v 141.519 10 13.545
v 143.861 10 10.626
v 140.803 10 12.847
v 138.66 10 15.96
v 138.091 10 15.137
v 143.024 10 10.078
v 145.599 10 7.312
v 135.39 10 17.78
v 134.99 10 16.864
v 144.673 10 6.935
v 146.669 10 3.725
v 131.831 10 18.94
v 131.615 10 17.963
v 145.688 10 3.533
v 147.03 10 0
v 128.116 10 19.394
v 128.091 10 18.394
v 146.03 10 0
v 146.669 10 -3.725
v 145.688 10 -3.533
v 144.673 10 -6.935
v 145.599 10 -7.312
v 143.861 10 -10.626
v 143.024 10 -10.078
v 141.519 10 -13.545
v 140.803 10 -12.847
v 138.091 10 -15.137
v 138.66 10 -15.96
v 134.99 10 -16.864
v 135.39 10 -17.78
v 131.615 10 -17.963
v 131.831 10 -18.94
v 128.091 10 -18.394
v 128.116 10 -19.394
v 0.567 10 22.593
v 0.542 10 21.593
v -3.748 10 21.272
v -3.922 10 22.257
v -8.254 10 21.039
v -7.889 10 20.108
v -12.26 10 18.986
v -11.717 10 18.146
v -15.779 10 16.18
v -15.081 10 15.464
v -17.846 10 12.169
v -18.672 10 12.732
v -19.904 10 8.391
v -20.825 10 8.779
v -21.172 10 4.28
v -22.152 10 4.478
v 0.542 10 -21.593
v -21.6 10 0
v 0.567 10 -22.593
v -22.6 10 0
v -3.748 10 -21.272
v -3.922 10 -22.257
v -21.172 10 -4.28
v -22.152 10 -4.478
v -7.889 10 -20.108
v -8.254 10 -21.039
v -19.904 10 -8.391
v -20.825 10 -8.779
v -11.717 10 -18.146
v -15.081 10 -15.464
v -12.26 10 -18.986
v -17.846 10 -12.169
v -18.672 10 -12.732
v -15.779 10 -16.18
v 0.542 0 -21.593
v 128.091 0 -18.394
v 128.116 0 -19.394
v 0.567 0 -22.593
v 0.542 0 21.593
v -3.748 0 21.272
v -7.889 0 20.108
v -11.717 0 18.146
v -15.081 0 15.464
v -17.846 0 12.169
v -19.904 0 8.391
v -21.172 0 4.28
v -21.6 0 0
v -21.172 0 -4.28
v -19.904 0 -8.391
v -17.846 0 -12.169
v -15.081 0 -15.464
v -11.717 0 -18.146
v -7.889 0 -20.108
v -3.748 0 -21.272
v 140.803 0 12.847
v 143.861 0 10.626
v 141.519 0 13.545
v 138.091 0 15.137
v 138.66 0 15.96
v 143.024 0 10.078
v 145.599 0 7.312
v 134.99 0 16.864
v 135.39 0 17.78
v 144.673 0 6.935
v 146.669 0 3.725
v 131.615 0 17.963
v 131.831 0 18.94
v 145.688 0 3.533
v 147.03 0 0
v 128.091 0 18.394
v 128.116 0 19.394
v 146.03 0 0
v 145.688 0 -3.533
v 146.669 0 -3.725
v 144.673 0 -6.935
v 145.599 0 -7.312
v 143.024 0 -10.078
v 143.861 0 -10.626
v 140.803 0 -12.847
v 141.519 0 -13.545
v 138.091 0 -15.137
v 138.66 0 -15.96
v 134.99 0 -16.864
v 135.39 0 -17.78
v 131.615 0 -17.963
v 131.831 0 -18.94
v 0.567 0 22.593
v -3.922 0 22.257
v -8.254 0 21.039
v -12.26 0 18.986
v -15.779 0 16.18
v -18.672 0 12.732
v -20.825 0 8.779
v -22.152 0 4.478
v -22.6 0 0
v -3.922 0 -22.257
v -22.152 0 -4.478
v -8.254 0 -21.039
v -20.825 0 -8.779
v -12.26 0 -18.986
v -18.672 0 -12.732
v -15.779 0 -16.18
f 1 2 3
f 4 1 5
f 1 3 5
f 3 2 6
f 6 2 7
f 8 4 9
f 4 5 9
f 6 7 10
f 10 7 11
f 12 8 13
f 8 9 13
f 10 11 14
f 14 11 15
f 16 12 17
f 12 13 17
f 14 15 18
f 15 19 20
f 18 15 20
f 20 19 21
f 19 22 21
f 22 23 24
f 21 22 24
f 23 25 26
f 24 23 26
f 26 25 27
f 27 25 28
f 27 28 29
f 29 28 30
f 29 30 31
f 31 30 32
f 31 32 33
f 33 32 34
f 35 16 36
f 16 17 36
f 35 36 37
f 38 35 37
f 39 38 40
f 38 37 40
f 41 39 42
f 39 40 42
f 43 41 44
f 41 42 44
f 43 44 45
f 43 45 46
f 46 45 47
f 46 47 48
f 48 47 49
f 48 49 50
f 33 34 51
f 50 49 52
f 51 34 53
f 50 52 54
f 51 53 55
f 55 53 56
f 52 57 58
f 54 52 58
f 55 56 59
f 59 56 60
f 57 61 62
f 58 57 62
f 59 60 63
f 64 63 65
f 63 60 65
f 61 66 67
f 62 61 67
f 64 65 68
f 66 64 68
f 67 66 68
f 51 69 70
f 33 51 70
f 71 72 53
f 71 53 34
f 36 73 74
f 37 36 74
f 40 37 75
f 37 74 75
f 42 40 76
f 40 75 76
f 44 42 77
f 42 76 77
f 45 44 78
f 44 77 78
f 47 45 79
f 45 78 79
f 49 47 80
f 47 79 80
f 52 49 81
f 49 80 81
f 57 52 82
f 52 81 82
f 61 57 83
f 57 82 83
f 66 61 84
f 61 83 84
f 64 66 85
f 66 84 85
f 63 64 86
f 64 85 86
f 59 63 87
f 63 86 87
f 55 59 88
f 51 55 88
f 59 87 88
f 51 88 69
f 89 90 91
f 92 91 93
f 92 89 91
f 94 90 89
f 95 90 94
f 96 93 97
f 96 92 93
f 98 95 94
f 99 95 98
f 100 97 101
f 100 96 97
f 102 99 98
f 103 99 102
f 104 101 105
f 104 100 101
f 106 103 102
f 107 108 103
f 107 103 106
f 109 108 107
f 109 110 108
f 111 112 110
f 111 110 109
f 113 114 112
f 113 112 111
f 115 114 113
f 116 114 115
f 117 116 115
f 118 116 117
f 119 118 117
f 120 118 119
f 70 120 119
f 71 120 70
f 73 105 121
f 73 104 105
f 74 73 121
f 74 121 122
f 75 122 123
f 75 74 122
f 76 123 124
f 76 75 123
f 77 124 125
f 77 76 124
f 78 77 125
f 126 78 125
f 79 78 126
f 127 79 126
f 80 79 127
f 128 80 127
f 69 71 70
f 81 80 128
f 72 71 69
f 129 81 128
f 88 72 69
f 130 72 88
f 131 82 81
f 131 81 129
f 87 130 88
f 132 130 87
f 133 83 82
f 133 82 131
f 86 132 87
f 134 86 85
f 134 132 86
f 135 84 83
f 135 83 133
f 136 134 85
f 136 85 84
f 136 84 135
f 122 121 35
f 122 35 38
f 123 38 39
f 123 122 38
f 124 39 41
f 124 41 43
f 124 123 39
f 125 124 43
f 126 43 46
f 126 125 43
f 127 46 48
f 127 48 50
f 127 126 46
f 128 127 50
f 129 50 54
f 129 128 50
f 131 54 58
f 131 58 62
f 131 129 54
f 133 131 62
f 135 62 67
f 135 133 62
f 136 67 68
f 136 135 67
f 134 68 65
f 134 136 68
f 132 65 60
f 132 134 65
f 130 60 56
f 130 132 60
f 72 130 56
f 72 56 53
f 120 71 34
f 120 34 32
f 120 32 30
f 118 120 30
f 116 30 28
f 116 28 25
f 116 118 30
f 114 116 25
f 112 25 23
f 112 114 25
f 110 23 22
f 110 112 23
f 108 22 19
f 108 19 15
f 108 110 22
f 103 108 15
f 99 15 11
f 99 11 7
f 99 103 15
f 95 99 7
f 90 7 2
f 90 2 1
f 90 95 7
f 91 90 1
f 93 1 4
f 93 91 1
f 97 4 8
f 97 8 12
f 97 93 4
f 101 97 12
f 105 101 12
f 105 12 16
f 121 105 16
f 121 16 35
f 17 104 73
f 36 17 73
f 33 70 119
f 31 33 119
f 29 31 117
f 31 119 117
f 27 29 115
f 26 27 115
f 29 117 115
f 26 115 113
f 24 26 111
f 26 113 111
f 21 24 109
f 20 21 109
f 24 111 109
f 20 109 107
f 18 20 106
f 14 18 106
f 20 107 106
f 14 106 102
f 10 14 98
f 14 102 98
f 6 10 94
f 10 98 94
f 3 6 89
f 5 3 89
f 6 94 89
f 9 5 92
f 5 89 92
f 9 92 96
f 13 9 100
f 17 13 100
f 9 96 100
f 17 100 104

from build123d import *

# Parameters (mm, degrees)
BOSS_EXTRUDE1_DEPTH = 10


with BuildPart() as part:
    # Sketch1 → Boss-Extrude1 (new body)
    with BuildSketch(Plane(origin=(0, 0, 0), x_dir=(1, 0, 0), z_dir=(0, 1, 0))):
        with BuildLine():
            Line((0.566637938, 22.592895375), (128.116406017, 19.39390134))
            ThreePointArc((128.116406017, 19.39390134), (147.03, 0), (128.116406017, -19.39390134))
            Line((128.116406017, -19.39390134), (0.566637938, -22.592895375))
            ThreePointArc((0.566637938, -22.592895375), (-22.6, 0), (0.566637938, 22.592895375))
        make_face()
        with BuildLine():
            Line((0.541565463, 21.593209739), (128.091333542, 18.394215704))
            ThreePointArc((128.091333542, 18.394215704), (146.03, 0), (128.091333542, -18.394215704))
            Line((128.091333542, -18.394215704), (0.541565463, -21.593209739))
            ThreePointArc((0.541565463, -21.593209739), (-21.6, 0), (0.541565463, 21.593209739))
        make_face(mode=Mode.SUBTRACT)
    extrude(amount=BOSS_EXTRUDE1_DEPTH)


solid = part.part
